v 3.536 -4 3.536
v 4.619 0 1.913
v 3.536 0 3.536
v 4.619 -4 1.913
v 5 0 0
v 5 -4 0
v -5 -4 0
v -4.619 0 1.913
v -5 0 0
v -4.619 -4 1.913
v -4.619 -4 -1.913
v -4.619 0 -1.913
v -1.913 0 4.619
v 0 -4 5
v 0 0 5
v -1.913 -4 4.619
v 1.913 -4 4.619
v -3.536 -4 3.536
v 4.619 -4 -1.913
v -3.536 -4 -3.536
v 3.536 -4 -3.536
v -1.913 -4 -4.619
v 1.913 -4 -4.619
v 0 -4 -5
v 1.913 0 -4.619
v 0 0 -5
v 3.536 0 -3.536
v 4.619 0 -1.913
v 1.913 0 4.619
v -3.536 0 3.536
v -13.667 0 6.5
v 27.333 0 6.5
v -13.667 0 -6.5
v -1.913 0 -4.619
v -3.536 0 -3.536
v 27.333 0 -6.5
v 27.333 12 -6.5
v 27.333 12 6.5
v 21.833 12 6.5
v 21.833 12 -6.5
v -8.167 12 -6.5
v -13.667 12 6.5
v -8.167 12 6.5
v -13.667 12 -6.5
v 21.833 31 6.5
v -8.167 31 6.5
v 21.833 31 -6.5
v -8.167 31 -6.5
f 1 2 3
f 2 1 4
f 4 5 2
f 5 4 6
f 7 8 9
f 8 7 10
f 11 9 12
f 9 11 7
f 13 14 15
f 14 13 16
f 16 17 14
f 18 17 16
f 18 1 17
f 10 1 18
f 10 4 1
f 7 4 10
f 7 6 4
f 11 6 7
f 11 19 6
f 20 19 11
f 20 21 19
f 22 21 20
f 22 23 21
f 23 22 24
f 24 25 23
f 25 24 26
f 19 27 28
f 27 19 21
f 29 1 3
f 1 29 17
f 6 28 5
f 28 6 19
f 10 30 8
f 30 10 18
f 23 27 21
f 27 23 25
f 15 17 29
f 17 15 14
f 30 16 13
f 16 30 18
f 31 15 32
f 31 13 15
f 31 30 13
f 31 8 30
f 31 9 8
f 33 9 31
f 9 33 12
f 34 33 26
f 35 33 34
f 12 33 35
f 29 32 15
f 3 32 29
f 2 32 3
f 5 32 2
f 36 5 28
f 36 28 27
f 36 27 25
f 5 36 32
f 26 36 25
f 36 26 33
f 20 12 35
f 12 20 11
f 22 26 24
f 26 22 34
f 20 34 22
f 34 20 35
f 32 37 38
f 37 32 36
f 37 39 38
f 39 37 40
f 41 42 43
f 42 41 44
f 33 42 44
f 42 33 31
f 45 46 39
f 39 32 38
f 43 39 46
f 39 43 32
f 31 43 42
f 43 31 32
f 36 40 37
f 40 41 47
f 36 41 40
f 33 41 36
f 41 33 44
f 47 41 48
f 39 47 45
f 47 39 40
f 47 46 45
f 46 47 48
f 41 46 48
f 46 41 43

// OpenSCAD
/*
A: 35mm
B: 30mm
C: 31mm
D: 13mm
E: 41mm
F: 19mm

40 degree on each side

29x13x30

*/
module baseServo() {
    sizeY = 13;
    baseHeight = 19;
    fixtureHeight = 31 - baseHeight;
    
    rotate([90, 0, 0])
    union() {
        // Tip
        cylinder((35-31), d=10);
        
        
        // Fixture
        translate([41/6, 0, -fixtureHeight / 2])
        cube([41, sizeY, fixtureHeight ], center=true);
        
        // Base
        translate([41/6, 0, -(fixtureHeight + baseHeight/2) ])
        cube([30, sizeY, baseHeight], center=true);
    }
}

/*
23.1x12x25.9

60 degree on each side
*/
module gripServo() {
    
}

baseServo();
